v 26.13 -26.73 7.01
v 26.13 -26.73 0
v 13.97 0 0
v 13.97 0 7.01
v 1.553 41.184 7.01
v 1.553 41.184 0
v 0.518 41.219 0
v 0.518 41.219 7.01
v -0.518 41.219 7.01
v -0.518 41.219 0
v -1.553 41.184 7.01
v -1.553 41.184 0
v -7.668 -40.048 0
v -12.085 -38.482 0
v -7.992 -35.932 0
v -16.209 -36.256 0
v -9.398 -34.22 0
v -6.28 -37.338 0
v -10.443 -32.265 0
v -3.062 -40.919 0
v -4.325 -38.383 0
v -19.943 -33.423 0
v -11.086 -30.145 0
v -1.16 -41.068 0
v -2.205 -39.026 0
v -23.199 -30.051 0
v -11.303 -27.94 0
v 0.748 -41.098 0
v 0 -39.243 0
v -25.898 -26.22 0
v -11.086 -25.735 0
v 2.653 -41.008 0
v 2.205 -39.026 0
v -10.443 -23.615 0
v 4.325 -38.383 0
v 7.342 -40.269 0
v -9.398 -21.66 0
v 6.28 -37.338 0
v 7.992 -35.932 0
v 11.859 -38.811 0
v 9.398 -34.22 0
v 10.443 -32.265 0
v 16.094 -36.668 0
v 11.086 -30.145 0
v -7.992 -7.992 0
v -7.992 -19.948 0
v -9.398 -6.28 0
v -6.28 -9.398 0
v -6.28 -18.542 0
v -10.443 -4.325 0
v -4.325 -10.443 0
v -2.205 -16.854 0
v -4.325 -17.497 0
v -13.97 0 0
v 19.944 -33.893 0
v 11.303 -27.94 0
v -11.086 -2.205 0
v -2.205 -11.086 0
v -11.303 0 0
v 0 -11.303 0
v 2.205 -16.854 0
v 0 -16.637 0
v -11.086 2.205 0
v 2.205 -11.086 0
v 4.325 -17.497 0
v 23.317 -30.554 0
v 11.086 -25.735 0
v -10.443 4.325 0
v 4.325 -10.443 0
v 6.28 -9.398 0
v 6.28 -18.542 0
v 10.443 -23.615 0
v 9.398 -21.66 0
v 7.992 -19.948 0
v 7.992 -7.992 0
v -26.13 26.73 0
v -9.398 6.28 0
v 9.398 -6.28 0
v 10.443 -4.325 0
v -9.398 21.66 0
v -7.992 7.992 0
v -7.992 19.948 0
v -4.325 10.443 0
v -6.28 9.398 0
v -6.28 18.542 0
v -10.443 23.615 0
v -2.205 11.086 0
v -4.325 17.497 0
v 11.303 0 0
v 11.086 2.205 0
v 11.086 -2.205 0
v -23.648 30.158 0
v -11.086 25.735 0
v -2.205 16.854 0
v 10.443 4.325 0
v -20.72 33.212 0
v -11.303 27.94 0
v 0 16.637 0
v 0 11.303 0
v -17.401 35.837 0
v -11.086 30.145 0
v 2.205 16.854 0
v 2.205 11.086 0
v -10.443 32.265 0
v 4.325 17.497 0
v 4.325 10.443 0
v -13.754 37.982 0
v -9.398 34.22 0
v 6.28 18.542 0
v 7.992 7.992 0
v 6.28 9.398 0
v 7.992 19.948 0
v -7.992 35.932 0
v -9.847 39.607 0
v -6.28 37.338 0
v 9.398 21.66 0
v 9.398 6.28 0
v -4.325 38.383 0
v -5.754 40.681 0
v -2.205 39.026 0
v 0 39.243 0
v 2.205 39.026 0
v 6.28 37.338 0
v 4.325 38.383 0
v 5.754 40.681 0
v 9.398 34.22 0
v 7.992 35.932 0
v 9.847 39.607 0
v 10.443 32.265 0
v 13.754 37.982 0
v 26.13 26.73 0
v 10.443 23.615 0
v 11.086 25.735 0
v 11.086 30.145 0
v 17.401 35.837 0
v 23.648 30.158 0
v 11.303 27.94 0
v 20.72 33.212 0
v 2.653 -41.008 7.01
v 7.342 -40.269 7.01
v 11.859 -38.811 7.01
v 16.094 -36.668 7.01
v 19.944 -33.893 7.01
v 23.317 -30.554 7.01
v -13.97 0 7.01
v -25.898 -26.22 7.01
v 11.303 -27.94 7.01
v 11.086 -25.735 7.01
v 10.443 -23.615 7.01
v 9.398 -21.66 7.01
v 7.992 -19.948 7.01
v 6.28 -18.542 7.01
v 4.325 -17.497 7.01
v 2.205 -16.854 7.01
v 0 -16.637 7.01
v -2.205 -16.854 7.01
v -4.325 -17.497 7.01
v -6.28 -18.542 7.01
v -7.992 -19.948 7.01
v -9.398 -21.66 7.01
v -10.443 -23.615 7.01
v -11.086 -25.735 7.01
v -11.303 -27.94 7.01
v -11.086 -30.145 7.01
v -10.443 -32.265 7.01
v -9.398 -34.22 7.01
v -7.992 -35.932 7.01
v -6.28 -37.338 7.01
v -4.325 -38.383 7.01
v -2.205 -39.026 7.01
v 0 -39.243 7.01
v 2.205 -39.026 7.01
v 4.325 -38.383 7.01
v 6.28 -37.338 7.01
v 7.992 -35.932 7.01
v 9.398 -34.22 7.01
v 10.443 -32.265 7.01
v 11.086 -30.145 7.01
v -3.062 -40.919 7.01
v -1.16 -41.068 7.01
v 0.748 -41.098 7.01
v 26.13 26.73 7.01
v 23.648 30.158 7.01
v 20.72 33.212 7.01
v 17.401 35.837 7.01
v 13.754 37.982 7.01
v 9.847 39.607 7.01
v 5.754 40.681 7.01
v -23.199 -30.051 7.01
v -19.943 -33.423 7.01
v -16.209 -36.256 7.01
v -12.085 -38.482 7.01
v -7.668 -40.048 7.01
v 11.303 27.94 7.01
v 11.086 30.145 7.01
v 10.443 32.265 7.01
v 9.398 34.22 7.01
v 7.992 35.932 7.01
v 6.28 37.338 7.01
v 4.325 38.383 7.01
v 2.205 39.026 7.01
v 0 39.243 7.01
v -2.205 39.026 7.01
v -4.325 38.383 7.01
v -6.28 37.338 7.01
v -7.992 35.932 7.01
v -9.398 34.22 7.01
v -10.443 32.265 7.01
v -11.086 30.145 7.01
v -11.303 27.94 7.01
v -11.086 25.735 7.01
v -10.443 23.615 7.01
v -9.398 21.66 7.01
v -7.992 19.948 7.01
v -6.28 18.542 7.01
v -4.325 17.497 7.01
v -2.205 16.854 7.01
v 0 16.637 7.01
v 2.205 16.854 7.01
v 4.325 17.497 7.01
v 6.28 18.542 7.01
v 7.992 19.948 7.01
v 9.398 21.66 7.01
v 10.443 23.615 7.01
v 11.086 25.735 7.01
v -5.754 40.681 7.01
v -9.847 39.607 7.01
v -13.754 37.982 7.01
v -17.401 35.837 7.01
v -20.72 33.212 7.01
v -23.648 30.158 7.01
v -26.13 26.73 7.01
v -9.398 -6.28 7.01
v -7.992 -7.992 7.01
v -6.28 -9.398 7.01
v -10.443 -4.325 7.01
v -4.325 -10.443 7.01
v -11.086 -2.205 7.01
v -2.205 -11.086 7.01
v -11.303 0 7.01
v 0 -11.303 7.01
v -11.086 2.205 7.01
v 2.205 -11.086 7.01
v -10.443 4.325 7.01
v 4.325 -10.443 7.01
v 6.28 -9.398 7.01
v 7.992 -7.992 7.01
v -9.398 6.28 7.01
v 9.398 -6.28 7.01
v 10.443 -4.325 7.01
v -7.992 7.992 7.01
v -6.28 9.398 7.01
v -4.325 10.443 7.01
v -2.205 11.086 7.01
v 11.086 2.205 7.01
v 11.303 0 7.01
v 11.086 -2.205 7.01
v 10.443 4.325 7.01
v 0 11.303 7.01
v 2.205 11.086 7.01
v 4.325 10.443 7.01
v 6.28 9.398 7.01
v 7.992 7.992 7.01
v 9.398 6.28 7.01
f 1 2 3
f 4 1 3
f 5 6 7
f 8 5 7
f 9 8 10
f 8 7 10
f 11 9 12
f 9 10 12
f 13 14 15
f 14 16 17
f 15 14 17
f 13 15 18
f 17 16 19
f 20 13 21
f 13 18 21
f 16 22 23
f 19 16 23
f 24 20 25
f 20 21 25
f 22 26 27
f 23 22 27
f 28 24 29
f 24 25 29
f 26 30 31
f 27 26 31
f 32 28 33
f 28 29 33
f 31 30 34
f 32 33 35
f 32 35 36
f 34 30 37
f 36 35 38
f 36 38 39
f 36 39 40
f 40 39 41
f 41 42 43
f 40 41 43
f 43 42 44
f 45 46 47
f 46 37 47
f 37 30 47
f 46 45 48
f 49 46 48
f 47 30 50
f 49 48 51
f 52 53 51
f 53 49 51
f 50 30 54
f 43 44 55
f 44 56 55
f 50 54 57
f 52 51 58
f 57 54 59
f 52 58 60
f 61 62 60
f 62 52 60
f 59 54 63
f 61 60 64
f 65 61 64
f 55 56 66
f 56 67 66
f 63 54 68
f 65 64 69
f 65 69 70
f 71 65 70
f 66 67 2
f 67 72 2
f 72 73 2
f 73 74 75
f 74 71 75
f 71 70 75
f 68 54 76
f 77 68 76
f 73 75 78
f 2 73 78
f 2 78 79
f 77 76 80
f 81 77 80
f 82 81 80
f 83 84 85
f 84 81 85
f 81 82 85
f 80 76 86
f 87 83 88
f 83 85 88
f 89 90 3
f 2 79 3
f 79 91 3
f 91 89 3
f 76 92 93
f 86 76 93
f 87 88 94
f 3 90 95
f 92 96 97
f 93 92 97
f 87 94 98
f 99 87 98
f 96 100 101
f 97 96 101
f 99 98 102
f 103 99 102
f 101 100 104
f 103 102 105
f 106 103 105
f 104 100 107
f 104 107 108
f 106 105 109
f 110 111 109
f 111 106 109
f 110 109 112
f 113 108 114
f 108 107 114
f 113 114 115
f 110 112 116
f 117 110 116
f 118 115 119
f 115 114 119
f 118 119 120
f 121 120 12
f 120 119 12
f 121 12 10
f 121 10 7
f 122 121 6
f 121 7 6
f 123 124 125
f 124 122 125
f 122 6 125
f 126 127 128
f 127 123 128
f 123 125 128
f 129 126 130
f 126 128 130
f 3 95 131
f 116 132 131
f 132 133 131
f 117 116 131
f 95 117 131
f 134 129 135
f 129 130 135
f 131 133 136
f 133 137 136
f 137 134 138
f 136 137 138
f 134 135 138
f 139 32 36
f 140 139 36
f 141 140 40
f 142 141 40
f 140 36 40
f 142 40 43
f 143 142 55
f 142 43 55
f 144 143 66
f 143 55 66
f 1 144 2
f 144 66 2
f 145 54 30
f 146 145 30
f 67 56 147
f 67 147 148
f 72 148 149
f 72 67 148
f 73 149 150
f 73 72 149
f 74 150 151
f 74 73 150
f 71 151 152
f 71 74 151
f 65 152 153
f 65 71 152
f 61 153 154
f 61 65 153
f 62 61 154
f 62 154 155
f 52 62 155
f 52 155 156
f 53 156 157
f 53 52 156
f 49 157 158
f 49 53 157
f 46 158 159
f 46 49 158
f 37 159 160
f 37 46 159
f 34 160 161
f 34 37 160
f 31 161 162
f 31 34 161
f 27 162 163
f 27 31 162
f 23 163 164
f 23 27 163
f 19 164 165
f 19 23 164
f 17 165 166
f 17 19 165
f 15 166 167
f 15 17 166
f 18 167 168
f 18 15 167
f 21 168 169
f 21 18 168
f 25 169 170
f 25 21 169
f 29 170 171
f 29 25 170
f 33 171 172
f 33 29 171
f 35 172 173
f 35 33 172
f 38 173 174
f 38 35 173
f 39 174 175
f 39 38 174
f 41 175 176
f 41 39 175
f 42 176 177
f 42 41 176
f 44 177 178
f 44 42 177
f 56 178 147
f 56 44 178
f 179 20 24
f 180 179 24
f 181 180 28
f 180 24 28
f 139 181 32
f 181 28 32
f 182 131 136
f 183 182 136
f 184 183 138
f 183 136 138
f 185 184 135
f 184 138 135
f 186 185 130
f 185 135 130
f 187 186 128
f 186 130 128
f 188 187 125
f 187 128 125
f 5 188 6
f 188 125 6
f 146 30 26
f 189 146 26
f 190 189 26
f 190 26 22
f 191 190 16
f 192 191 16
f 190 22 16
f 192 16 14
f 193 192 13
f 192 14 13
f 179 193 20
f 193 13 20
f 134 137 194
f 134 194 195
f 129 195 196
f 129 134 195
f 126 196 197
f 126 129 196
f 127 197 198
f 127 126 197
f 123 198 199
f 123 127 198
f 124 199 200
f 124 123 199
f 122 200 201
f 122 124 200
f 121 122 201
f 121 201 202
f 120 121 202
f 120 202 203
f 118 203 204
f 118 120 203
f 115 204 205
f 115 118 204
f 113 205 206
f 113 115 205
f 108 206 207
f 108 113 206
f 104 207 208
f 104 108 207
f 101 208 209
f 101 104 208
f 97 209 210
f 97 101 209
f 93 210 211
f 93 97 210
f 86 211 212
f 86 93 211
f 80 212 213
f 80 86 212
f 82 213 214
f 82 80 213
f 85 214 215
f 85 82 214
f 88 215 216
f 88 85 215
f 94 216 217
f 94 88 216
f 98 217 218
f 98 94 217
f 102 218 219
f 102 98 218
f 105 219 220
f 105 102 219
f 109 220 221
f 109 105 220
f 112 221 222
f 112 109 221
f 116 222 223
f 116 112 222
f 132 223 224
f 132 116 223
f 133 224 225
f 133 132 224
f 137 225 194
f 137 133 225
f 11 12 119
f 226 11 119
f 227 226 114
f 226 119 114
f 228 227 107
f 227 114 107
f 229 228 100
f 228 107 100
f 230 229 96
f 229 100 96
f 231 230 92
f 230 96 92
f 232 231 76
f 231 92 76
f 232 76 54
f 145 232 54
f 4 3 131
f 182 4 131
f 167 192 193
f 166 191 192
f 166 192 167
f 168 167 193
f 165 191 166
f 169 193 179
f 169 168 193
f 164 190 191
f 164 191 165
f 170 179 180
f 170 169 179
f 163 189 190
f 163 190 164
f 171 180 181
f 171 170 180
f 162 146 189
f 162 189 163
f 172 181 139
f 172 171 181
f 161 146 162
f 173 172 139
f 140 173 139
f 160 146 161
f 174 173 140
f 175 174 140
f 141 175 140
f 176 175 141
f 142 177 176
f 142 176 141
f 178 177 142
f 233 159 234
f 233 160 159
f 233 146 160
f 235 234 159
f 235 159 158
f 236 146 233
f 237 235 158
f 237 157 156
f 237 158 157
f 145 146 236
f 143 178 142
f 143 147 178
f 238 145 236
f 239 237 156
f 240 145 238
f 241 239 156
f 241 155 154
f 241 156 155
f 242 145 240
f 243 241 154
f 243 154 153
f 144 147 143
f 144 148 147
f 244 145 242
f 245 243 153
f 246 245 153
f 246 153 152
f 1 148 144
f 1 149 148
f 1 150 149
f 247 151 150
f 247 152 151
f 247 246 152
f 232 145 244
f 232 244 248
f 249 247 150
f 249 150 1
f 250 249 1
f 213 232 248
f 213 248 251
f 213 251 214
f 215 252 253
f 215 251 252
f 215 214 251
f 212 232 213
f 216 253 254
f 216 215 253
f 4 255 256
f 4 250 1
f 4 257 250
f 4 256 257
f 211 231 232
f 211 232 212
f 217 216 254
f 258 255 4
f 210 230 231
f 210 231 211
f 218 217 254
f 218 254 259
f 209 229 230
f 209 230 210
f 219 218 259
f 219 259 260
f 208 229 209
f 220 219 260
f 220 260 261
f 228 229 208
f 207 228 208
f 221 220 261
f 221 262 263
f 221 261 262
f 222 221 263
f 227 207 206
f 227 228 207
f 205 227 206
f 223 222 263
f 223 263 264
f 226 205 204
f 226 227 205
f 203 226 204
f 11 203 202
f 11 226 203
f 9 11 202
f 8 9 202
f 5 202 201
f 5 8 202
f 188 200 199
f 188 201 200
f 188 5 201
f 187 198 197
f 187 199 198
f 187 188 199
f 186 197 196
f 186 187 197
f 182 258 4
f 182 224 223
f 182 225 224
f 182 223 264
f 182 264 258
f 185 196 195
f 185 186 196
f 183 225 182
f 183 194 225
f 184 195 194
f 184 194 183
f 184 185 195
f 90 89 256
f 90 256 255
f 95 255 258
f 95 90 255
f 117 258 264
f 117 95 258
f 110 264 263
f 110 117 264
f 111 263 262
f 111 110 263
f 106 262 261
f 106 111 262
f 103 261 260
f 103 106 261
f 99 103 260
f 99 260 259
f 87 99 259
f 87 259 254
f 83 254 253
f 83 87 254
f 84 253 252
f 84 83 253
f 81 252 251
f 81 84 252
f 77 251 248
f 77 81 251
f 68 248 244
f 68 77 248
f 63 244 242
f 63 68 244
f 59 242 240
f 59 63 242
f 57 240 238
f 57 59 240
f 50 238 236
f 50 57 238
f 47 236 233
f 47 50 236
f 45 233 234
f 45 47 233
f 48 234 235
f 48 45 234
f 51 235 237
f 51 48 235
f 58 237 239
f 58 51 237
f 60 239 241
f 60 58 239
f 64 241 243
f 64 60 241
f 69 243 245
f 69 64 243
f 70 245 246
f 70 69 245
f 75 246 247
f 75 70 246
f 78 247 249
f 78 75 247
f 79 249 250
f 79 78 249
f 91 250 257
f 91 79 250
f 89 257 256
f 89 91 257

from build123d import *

# Parameters (mm, degrees)
F0_R     = 11.303
F1_DEPTH = 7.0104


# Not quite as in the source:
# - a feature names something its author has since deleted; it is built from what else it names


with BuildPart() as f1:
    # F0 (on Top) → F1 (new body)
    with BuildSketch(Plane.XY):
        with BuildLine():
            ThreePointArc((-8.4576062893, 17.6302414744), (0, 14.605), (8.4576062893, 17.6302414744))
            ThreePointArc((8.4576062893, 17.6302414744), (12.0541363205, 22.2373670497), (13.335, 27.94))
            ThreePointArc((13.335, 27.94), (9.9631286308, 36.8033116207), (1.552728851, 41.1842915294))
            ThreePointArc((1.552728851, 41.1842915294), (0, 41.2234534857), (-1.552728851, 41.1842915294))
            ThreePointArc((-1.552728851, 41.1842915294), (-12.7964847088, 31.6912936565), (-8.4576062893, 17.6302414744))
        make_face()
        with Locations((0, 27.94)):
            Circle(F0_R, mode=Mode.SUBTRACT)
        with BuildLine():
            ThreePointArc((-8.4410840797, 11.1314419353), (0, 13.97), (8.4410840797, 11.1314419353))
            ThreePointArc((8.4410840797, 11.1314419353), (7.023943937, 14.3844655708), (8.4576062893, 17.6302414744))
            ThreePointArc((8.4576062893, 17.6302414744), (0, 14.605), (-8.4576062893, 17.6302414744))
            ThreePointArc((-8.4576062893, 17.6302414744), (-7.1686601212, 14.3840976519), (-8.4410840797, 11.1314419353))
        make_face()
        with BuildLine():
            ThreePointArc((8.4410840797, -11.1314419353), (12.5116514616, -6.2144571527), (13.97, 0))
            ThreePointArc((13.97, 0), (12.5116514616, 6.2144571527), (8.4410840797, 11.1314419353))
            ThreePointArc((8.4410840797, 11.1314419353), (0, 13.97), (-8.4410840797, 11.1314419353))
            ThreePointArc((-8.4410840797, 11.1314419353), (-12.5116514616, 6.2144571527), (-13.97, 0))
            ThreePointArc((-13.97, 0), (-12.5116514616, -6.2144571527), (-8.4410840797, -11.1314419353))
            ThreePointArc((-8.4410840797, -11.1314419353), (0, -13.97), (8.4410840797, -11.1314419353))
        make_face()
        Circle(F0_R, mode=Mode.SUBTRACT)
        with BuildLine():
            ThreePointArc((8.4410840797, -17.616709606), (7.0831122532, -14.3740757706), (8.4410840797, -11.1314419353))
            ThreePointArc((8.4410840797, -11.1314419353), (0, -13.97), (-8.4410840797, -11.1314419353))
            ThreePointArc((-8.4410840797, -11.1314419353), (-7.1012049909, -14.3740757706), (-8.4410840797, -17.616709606))
            ThreePointArc((-8.4410840797, -17.616709606), (0, -14.605), (8.4410840797, -17.616709606))
        make_face()
        with BuildLine():
            ThreePointArc((13.335, -27.94), (12.0495659922, -22.2277163587), (8.4410840797, -17.616709606))
            ThreePointArc((8.4410840797, -17.616709606), (0, -14.605), (-8.4410840797, -17.616709606))
            ThreePointArc((-8.4410840797, -17.616709606), (-12.9933407259, -30.9392201953), (-3.0623665698, -40.9186030062))
            ThreePointArc((-3.0623665698, -40.9186030062), (-0.2065651455, -41.0979009929), (2.6534571531, -41.0083354004))
            ThreePointArc((2.6534571531, -41.0083354004), (10.3248747241, -36.3791461021), (13.335, -27.94))
        make_face()
        with Locations((0, -27.94)):
            Circle(F0_R, mode=Mode.SUBTRACT)
        with BuildLine():
            ThreePointArc((-13.97, 0), (-12.5116514616, 6.2144571527), (-8.4410840797, 11.1314419353))
            ThreePointArc((-8.4410840797, 11.1314419353), (-7.1686601212, 14.3840976519), (-8.4576062893, 17.6302414744))
            ThreePointArc((-8.4576062893, 17.6302414744), (-12.7964847088, 31.6912936565), (-1.552728851, 41.1842915294))
            ThreePointArc((-1.552728851, 41.1842915294), (-15.6144282797, 36.9723347017), (-26.1298660189, 26.7303846776))
            Line((-26.1298660189, 26.7303846776), (-13.97, 0))
        make_face()
        with BuildLine():
            ThreePointArc((8.4410840797, 11.1314419353), (12.5116514616, 6.2144571527), (13.97, 0))
            Line((13.97, 0), (26.1298660189, 26.7303846776))
            ThreePointArc((26.1298660189, 26.7303846776), (15.6144282797, 36.9723347017), (1.552728851, 41.1842915294))
            ThreePointArc((1.552728851, 41.1842915294), (9.9631286308, 36.8033116207), (13.335, 27.94))
            ThreePointArc((13.335, 27.94), (12.0541363205, 22.2373670497), (8.4576062893, 17.6302414744))
            ThreePointArc((8.4576062893, 17.6302414744), (7.023943937, 14.3844655708), (8.4410840797, 11.1314419353))
        make_face()
        with BuildLine():
            Line((26.1298660189, -26.7303846776), (13.97, 0))
            ThreePointArc((13.97, 0), (12.5116514616, -6.2144571527), (8.4410840797, -11.1314419353))
            ThreePointArc((8.4410840797, -11.1314419353), (7.0831122532, -14.3740757706), (8.4410840797, -17.616709606))
            ThreePointArc((8.4410840797, -17.616709606), (12.0495659922, -22.2277163587), (13.335, -27.94))
            ThreePointArc((13.335, -27.94), (10.3248747241, -36.3791461021), (2.6534571531, -41.0083354004))
            ThreePointArc((2.6534571531, -41.0083354004), (16.0937498742, -36.6680054018), (26.1298660189, -26.7303846776))
        make_face()
        with BuildLine():
            ThreePointArc((-8.4410840797, -17.616709606), (-7.1012049909, -14.3740757706), (-8.4410840797, -11.1314419353))
            ThreePointArc((-8.4410840797, -11.1314419353), (-12.5116514616, -6.2144571527), (-13.97, 0))
            Line((-13.97, 0), (-25.8976111474, -26.2198311856))
            ThreePointArc((-25.8976111474, -26.2198311856), (-16.209405425, -36.2559483923), (-3.0623665698, -40.9186030062))
            ThreePointArc((-3.0623665698, -40.9186030062), (-12.9933407259, -30.9392201953), (-8.4410840797, -17.616709606))
        make_face()
    extrude(amount=F1_DEPTH)


solid = f1.part
